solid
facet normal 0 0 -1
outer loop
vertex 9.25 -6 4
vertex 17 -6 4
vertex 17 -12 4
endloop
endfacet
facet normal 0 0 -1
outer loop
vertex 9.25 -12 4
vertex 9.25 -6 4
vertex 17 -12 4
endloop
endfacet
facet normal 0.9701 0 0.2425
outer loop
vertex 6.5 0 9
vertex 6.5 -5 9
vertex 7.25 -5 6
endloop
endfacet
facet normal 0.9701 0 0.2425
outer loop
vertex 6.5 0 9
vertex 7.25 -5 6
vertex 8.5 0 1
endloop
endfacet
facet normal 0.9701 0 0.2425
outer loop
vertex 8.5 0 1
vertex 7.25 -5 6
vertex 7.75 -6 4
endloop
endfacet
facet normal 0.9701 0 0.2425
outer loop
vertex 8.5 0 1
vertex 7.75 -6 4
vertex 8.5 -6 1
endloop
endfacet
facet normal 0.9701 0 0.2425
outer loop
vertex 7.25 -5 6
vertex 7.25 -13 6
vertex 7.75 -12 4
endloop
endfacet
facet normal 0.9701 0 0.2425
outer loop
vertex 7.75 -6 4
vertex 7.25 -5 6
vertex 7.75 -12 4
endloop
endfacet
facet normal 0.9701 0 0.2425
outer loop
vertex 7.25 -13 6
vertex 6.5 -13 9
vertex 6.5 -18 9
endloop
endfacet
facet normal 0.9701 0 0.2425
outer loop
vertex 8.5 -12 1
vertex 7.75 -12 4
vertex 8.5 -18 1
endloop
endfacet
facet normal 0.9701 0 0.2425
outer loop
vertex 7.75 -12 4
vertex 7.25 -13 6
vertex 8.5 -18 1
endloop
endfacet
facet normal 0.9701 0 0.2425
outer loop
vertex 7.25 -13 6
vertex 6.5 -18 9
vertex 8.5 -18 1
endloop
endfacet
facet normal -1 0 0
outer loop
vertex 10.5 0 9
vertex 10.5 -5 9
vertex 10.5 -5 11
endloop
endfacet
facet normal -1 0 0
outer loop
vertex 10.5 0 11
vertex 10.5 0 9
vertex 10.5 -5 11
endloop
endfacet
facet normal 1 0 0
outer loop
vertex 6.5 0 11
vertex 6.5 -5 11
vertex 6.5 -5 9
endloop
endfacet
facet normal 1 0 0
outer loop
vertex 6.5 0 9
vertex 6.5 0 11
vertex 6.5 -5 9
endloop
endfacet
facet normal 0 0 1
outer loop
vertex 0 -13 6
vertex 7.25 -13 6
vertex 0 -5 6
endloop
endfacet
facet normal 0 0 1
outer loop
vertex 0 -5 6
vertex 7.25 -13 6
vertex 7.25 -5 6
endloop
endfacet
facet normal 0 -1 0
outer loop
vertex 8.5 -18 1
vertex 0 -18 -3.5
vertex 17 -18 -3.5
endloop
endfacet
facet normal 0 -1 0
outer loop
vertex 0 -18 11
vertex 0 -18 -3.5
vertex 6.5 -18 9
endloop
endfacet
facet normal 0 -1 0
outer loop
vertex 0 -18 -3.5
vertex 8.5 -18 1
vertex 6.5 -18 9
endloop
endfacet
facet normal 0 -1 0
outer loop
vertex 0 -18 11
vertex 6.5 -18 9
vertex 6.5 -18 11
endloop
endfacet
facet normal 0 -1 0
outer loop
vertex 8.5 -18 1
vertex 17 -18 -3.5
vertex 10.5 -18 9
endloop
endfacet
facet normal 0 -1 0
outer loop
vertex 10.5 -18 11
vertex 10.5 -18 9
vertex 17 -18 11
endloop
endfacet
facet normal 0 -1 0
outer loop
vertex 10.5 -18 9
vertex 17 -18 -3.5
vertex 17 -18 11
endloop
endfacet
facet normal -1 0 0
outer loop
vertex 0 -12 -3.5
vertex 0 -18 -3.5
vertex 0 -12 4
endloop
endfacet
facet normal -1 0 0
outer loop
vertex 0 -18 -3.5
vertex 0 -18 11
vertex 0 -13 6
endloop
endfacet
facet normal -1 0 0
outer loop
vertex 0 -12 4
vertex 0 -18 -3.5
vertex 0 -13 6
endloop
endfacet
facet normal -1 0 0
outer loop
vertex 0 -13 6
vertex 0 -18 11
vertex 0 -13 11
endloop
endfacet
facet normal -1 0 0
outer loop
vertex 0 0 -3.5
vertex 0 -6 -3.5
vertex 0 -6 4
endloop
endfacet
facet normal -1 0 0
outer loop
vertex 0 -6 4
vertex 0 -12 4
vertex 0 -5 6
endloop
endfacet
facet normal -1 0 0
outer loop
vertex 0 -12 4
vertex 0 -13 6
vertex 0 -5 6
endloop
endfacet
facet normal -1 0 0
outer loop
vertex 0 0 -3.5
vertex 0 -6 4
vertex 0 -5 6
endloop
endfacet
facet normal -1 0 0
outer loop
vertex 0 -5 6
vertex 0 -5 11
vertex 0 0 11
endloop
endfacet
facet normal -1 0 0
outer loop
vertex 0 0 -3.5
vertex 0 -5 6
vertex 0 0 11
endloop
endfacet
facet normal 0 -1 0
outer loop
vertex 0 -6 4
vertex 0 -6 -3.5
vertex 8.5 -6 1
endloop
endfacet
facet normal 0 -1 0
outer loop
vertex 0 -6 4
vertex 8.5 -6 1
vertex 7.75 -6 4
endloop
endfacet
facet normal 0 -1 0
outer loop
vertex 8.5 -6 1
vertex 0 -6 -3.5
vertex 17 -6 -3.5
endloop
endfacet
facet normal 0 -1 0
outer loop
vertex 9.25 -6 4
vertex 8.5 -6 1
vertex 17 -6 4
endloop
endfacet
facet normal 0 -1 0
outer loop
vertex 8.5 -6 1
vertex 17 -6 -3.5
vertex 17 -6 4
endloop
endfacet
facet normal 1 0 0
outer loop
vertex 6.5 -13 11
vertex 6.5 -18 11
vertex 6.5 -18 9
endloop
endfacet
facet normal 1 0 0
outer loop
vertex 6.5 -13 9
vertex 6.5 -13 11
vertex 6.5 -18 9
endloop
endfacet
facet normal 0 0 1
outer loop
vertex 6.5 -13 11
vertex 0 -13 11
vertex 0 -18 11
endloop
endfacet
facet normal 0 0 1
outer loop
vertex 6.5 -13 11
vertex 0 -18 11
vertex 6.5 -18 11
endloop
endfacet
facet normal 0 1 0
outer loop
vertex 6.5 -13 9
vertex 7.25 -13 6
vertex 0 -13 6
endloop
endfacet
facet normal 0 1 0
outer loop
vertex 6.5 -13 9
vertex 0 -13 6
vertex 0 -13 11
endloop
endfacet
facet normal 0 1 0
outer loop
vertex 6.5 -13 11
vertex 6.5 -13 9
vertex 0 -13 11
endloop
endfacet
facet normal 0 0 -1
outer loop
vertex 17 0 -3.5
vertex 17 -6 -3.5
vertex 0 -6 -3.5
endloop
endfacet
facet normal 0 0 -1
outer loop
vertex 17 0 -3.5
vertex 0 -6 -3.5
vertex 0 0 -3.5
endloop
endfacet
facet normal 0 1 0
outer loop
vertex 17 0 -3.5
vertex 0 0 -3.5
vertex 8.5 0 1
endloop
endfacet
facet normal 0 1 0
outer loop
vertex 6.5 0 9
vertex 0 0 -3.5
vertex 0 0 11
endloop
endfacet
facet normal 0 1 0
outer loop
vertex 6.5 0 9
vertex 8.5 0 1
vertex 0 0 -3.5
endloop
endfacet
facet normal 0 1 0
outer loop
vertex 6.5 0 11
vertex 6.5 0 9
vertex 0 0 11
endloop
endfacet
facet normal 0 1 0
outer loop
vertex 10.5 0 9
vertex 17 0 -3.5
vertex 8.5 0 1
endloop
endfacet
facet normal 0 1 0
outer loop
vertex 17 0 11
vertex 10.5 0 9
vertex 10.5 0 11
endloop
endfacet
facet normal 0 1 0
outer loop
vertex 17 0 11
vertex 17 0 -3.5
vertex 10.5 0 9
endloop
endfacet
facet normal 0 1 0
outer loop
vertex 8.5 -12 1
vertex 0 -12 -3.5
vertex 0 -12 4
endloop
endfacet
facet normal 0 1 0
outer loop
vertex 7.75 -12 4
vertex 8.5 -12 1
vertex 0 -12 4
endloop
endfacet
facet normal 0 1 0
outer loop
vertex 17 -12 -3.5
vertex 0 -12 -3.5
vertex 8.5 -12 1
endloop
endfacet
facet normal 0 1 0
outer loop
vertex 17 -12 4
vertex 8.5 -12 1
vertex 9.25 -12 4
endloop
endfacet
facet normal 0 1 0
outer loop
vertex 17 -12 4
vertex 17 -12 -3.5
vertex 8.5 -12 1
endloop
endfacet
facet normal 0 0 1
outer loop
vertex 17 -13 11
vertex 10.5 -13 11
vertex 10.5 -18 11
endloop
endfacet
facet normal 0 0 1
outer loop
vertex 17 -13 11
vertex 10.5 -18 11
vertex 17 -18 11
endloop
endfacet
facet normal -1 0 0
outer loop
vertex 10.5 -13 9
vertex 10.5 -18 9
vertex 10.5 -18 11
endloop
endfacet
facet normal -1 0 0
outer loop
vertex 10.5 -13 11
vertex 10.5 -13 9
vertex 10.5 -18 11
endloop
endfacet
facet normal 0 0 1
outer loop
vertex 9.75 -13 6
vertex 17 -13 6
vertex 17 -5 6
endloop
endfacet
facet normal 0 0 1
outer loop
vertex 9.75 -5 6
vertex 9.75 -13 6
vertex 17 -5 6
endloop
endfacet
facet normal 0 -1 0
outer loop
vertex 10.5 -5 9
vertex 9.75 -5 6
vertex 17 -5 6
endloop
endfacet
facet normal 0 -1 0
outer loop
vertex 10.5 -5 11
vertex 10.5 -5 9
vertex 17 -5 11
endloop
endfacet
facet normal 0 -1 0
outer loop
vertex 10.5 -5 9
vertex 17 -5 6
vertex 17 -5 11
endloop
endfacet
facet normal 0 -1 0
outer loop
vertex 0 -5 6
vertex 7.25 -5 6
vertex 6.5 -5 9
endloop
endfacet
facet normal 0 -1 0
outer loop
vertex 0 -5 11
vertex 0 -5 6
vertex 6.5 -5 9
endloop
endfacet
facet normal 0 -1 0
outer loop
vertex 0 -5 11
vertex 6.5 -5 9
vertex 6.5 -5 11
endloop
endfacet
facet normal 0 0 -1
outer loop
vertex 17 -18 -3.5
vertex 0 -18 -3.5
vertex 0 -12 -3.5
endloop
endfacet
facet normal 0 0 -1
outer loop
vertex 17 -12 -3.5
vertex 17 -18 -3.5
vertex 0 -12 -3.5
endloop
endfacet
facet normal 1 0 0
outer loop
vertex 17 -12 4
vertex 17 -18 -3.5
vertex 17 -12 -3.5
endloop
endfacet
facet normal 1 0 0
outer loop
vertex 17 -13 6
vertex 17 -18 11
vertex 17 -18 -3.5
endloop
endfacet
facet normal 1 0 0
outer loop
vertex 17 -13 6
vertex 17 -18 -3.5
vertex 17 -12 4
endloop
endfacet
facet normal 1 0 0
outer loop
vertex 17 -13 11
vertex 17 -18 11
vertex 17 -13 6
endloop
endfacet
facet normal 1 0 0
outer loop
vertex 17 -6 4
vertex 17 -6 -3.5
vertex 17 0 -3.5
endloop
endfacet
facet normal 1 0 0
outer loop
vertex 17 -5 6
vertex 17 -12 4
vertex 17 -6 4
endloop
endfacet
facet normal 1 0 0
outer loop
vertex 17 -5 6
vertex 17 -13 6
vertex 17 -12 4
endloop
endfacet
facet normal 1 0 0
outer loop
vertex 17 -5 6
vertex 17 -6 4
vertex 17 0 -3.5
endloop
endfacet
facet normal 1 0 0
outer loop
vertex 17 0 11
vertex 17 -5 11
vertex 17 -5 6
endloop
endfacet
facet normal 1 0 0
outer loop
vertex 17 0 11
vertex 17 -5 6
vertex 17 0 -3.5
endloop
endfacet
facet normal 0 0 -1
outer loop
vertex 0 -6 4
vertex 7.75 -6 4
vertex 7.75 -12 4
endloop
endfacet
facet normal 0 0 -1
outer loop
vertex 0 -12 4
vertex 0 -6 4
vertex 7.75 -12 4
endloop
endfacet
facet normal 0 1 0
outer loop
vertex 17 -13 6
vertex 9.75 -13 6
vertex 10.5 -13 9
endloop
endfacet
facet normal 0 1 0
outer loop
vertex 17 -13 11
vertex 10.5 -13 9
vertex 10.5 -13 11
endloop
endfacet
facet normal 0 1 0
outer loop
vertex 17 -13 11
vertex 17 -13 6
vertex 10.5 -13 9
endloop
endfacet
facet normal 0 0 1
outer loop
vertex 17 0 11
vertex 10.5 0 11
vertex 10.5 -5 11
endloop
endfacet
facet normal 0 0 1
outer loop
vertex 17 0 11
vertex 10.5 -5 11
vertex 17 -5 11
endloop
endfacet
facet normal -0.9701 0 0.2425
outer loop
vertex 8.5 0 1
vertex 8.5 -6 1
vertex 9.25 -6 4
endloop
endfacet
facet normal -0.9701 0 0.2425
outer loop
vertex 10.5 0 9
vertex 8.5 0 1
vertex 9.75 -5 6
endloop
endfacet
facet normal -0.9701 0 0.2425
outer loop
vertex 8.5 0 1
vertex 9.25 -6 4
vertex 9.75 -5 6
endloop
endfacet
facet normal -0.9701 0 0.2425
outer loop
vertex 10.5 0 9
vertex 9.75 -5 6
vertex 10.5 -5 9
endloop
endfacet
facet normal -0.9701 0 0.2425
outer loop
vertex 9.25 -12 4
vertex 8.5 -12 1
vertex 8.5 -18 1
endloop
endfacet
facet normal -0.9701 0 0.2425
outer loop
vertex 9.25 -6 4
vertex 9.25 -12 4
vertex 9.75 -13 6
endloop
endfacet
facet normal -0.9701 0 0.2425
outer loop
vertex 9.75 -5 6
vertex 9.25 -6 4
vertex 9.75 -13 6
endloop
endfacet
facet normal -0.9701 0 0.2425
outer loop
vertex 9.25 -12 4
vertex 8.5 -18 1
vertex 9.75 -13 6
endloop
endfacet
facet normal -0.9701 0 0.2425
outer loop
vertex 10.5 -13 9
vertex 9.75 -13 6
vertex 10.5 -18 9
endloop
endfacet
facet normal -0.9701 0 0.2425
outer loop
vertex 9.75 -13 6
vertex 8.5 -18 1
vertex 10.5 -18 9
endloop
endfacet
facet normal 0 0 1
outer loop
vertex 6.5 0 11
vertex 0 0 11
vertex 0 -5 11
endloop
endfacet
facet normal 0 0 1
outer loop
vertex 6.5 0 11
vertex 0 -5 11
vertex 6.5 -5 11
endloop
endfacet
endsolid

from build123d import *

# Parameters (mm, degrees)
F0_W      = 17
F0_H      = 11
F1_DEPTH  = 18
F3_DEPTH  = 25
F4_W      = 8
F4_H      = 5
F5_DEPTH  = 25
F7_DEPTH  = 25
F8_W      = 6
F8_H      = 3.5
F9_DEPTH  = 17
F10_W     = 6
F10_H     = 3.5
F11_DEPTH = 17


with BuildPart() as f1:
    # F0 (on Front) → F1 (new body)
    with BuildSketch(Plane.XZ):
        with Locations((8.5, 5.5)):
            Rectangle(F0_W, F0_H)
    extrude(amount=F1_DEPTH)

    # F2 (on face) → F3 (cut)
    with BuildSketch(Plane.XZ.offset(18)):
        Polygon((10.5, 9), (10.5, 11), (6.5, 11), (6.5, 9), (8.5, 1), align=None)
    extrude(amount=-F3_DEPTH, mode=Mode.SUBTRACT)

    # F4 (on face) → F5 (cut)
    with BuildSketch(Plane.YZ.offset(17)):
        with Locations((-9, 8.5)):
            Rectangle(F4_W, F4_H)
    extrude(amount=-F5_DEPTH, mode=Mode.SUBTRACT)

    # F6 (on face) → F7 (cut)
    with BuildSketch(Plane.YZ.offset(17)):
        Polygon((-6, 4), (-9, 4), (-12, 4), (-12, 0), (-6, 0), align=None)
    extrude(amount=-F7_DEPTH, mode=Mode.SUBTRACT)

    # F8 (on face) → F9 (join)
    with BuildSketch(Plane.YZ.offset(17)):
        with Locations((-3, -1.75)):
            Rectangle(F8_W, F8_H)
    extrude(amount=-F9_DEPTH)

    # F10 (on face) → F11 (join)
    with BuildSketch(Plane.YZ.offset(17)):
        with Locations((-15, -1.75)):
            Rectangle(F10_W, F10_H)
    extrude(amount=-F11_DEPTH)


solid = f1.part
